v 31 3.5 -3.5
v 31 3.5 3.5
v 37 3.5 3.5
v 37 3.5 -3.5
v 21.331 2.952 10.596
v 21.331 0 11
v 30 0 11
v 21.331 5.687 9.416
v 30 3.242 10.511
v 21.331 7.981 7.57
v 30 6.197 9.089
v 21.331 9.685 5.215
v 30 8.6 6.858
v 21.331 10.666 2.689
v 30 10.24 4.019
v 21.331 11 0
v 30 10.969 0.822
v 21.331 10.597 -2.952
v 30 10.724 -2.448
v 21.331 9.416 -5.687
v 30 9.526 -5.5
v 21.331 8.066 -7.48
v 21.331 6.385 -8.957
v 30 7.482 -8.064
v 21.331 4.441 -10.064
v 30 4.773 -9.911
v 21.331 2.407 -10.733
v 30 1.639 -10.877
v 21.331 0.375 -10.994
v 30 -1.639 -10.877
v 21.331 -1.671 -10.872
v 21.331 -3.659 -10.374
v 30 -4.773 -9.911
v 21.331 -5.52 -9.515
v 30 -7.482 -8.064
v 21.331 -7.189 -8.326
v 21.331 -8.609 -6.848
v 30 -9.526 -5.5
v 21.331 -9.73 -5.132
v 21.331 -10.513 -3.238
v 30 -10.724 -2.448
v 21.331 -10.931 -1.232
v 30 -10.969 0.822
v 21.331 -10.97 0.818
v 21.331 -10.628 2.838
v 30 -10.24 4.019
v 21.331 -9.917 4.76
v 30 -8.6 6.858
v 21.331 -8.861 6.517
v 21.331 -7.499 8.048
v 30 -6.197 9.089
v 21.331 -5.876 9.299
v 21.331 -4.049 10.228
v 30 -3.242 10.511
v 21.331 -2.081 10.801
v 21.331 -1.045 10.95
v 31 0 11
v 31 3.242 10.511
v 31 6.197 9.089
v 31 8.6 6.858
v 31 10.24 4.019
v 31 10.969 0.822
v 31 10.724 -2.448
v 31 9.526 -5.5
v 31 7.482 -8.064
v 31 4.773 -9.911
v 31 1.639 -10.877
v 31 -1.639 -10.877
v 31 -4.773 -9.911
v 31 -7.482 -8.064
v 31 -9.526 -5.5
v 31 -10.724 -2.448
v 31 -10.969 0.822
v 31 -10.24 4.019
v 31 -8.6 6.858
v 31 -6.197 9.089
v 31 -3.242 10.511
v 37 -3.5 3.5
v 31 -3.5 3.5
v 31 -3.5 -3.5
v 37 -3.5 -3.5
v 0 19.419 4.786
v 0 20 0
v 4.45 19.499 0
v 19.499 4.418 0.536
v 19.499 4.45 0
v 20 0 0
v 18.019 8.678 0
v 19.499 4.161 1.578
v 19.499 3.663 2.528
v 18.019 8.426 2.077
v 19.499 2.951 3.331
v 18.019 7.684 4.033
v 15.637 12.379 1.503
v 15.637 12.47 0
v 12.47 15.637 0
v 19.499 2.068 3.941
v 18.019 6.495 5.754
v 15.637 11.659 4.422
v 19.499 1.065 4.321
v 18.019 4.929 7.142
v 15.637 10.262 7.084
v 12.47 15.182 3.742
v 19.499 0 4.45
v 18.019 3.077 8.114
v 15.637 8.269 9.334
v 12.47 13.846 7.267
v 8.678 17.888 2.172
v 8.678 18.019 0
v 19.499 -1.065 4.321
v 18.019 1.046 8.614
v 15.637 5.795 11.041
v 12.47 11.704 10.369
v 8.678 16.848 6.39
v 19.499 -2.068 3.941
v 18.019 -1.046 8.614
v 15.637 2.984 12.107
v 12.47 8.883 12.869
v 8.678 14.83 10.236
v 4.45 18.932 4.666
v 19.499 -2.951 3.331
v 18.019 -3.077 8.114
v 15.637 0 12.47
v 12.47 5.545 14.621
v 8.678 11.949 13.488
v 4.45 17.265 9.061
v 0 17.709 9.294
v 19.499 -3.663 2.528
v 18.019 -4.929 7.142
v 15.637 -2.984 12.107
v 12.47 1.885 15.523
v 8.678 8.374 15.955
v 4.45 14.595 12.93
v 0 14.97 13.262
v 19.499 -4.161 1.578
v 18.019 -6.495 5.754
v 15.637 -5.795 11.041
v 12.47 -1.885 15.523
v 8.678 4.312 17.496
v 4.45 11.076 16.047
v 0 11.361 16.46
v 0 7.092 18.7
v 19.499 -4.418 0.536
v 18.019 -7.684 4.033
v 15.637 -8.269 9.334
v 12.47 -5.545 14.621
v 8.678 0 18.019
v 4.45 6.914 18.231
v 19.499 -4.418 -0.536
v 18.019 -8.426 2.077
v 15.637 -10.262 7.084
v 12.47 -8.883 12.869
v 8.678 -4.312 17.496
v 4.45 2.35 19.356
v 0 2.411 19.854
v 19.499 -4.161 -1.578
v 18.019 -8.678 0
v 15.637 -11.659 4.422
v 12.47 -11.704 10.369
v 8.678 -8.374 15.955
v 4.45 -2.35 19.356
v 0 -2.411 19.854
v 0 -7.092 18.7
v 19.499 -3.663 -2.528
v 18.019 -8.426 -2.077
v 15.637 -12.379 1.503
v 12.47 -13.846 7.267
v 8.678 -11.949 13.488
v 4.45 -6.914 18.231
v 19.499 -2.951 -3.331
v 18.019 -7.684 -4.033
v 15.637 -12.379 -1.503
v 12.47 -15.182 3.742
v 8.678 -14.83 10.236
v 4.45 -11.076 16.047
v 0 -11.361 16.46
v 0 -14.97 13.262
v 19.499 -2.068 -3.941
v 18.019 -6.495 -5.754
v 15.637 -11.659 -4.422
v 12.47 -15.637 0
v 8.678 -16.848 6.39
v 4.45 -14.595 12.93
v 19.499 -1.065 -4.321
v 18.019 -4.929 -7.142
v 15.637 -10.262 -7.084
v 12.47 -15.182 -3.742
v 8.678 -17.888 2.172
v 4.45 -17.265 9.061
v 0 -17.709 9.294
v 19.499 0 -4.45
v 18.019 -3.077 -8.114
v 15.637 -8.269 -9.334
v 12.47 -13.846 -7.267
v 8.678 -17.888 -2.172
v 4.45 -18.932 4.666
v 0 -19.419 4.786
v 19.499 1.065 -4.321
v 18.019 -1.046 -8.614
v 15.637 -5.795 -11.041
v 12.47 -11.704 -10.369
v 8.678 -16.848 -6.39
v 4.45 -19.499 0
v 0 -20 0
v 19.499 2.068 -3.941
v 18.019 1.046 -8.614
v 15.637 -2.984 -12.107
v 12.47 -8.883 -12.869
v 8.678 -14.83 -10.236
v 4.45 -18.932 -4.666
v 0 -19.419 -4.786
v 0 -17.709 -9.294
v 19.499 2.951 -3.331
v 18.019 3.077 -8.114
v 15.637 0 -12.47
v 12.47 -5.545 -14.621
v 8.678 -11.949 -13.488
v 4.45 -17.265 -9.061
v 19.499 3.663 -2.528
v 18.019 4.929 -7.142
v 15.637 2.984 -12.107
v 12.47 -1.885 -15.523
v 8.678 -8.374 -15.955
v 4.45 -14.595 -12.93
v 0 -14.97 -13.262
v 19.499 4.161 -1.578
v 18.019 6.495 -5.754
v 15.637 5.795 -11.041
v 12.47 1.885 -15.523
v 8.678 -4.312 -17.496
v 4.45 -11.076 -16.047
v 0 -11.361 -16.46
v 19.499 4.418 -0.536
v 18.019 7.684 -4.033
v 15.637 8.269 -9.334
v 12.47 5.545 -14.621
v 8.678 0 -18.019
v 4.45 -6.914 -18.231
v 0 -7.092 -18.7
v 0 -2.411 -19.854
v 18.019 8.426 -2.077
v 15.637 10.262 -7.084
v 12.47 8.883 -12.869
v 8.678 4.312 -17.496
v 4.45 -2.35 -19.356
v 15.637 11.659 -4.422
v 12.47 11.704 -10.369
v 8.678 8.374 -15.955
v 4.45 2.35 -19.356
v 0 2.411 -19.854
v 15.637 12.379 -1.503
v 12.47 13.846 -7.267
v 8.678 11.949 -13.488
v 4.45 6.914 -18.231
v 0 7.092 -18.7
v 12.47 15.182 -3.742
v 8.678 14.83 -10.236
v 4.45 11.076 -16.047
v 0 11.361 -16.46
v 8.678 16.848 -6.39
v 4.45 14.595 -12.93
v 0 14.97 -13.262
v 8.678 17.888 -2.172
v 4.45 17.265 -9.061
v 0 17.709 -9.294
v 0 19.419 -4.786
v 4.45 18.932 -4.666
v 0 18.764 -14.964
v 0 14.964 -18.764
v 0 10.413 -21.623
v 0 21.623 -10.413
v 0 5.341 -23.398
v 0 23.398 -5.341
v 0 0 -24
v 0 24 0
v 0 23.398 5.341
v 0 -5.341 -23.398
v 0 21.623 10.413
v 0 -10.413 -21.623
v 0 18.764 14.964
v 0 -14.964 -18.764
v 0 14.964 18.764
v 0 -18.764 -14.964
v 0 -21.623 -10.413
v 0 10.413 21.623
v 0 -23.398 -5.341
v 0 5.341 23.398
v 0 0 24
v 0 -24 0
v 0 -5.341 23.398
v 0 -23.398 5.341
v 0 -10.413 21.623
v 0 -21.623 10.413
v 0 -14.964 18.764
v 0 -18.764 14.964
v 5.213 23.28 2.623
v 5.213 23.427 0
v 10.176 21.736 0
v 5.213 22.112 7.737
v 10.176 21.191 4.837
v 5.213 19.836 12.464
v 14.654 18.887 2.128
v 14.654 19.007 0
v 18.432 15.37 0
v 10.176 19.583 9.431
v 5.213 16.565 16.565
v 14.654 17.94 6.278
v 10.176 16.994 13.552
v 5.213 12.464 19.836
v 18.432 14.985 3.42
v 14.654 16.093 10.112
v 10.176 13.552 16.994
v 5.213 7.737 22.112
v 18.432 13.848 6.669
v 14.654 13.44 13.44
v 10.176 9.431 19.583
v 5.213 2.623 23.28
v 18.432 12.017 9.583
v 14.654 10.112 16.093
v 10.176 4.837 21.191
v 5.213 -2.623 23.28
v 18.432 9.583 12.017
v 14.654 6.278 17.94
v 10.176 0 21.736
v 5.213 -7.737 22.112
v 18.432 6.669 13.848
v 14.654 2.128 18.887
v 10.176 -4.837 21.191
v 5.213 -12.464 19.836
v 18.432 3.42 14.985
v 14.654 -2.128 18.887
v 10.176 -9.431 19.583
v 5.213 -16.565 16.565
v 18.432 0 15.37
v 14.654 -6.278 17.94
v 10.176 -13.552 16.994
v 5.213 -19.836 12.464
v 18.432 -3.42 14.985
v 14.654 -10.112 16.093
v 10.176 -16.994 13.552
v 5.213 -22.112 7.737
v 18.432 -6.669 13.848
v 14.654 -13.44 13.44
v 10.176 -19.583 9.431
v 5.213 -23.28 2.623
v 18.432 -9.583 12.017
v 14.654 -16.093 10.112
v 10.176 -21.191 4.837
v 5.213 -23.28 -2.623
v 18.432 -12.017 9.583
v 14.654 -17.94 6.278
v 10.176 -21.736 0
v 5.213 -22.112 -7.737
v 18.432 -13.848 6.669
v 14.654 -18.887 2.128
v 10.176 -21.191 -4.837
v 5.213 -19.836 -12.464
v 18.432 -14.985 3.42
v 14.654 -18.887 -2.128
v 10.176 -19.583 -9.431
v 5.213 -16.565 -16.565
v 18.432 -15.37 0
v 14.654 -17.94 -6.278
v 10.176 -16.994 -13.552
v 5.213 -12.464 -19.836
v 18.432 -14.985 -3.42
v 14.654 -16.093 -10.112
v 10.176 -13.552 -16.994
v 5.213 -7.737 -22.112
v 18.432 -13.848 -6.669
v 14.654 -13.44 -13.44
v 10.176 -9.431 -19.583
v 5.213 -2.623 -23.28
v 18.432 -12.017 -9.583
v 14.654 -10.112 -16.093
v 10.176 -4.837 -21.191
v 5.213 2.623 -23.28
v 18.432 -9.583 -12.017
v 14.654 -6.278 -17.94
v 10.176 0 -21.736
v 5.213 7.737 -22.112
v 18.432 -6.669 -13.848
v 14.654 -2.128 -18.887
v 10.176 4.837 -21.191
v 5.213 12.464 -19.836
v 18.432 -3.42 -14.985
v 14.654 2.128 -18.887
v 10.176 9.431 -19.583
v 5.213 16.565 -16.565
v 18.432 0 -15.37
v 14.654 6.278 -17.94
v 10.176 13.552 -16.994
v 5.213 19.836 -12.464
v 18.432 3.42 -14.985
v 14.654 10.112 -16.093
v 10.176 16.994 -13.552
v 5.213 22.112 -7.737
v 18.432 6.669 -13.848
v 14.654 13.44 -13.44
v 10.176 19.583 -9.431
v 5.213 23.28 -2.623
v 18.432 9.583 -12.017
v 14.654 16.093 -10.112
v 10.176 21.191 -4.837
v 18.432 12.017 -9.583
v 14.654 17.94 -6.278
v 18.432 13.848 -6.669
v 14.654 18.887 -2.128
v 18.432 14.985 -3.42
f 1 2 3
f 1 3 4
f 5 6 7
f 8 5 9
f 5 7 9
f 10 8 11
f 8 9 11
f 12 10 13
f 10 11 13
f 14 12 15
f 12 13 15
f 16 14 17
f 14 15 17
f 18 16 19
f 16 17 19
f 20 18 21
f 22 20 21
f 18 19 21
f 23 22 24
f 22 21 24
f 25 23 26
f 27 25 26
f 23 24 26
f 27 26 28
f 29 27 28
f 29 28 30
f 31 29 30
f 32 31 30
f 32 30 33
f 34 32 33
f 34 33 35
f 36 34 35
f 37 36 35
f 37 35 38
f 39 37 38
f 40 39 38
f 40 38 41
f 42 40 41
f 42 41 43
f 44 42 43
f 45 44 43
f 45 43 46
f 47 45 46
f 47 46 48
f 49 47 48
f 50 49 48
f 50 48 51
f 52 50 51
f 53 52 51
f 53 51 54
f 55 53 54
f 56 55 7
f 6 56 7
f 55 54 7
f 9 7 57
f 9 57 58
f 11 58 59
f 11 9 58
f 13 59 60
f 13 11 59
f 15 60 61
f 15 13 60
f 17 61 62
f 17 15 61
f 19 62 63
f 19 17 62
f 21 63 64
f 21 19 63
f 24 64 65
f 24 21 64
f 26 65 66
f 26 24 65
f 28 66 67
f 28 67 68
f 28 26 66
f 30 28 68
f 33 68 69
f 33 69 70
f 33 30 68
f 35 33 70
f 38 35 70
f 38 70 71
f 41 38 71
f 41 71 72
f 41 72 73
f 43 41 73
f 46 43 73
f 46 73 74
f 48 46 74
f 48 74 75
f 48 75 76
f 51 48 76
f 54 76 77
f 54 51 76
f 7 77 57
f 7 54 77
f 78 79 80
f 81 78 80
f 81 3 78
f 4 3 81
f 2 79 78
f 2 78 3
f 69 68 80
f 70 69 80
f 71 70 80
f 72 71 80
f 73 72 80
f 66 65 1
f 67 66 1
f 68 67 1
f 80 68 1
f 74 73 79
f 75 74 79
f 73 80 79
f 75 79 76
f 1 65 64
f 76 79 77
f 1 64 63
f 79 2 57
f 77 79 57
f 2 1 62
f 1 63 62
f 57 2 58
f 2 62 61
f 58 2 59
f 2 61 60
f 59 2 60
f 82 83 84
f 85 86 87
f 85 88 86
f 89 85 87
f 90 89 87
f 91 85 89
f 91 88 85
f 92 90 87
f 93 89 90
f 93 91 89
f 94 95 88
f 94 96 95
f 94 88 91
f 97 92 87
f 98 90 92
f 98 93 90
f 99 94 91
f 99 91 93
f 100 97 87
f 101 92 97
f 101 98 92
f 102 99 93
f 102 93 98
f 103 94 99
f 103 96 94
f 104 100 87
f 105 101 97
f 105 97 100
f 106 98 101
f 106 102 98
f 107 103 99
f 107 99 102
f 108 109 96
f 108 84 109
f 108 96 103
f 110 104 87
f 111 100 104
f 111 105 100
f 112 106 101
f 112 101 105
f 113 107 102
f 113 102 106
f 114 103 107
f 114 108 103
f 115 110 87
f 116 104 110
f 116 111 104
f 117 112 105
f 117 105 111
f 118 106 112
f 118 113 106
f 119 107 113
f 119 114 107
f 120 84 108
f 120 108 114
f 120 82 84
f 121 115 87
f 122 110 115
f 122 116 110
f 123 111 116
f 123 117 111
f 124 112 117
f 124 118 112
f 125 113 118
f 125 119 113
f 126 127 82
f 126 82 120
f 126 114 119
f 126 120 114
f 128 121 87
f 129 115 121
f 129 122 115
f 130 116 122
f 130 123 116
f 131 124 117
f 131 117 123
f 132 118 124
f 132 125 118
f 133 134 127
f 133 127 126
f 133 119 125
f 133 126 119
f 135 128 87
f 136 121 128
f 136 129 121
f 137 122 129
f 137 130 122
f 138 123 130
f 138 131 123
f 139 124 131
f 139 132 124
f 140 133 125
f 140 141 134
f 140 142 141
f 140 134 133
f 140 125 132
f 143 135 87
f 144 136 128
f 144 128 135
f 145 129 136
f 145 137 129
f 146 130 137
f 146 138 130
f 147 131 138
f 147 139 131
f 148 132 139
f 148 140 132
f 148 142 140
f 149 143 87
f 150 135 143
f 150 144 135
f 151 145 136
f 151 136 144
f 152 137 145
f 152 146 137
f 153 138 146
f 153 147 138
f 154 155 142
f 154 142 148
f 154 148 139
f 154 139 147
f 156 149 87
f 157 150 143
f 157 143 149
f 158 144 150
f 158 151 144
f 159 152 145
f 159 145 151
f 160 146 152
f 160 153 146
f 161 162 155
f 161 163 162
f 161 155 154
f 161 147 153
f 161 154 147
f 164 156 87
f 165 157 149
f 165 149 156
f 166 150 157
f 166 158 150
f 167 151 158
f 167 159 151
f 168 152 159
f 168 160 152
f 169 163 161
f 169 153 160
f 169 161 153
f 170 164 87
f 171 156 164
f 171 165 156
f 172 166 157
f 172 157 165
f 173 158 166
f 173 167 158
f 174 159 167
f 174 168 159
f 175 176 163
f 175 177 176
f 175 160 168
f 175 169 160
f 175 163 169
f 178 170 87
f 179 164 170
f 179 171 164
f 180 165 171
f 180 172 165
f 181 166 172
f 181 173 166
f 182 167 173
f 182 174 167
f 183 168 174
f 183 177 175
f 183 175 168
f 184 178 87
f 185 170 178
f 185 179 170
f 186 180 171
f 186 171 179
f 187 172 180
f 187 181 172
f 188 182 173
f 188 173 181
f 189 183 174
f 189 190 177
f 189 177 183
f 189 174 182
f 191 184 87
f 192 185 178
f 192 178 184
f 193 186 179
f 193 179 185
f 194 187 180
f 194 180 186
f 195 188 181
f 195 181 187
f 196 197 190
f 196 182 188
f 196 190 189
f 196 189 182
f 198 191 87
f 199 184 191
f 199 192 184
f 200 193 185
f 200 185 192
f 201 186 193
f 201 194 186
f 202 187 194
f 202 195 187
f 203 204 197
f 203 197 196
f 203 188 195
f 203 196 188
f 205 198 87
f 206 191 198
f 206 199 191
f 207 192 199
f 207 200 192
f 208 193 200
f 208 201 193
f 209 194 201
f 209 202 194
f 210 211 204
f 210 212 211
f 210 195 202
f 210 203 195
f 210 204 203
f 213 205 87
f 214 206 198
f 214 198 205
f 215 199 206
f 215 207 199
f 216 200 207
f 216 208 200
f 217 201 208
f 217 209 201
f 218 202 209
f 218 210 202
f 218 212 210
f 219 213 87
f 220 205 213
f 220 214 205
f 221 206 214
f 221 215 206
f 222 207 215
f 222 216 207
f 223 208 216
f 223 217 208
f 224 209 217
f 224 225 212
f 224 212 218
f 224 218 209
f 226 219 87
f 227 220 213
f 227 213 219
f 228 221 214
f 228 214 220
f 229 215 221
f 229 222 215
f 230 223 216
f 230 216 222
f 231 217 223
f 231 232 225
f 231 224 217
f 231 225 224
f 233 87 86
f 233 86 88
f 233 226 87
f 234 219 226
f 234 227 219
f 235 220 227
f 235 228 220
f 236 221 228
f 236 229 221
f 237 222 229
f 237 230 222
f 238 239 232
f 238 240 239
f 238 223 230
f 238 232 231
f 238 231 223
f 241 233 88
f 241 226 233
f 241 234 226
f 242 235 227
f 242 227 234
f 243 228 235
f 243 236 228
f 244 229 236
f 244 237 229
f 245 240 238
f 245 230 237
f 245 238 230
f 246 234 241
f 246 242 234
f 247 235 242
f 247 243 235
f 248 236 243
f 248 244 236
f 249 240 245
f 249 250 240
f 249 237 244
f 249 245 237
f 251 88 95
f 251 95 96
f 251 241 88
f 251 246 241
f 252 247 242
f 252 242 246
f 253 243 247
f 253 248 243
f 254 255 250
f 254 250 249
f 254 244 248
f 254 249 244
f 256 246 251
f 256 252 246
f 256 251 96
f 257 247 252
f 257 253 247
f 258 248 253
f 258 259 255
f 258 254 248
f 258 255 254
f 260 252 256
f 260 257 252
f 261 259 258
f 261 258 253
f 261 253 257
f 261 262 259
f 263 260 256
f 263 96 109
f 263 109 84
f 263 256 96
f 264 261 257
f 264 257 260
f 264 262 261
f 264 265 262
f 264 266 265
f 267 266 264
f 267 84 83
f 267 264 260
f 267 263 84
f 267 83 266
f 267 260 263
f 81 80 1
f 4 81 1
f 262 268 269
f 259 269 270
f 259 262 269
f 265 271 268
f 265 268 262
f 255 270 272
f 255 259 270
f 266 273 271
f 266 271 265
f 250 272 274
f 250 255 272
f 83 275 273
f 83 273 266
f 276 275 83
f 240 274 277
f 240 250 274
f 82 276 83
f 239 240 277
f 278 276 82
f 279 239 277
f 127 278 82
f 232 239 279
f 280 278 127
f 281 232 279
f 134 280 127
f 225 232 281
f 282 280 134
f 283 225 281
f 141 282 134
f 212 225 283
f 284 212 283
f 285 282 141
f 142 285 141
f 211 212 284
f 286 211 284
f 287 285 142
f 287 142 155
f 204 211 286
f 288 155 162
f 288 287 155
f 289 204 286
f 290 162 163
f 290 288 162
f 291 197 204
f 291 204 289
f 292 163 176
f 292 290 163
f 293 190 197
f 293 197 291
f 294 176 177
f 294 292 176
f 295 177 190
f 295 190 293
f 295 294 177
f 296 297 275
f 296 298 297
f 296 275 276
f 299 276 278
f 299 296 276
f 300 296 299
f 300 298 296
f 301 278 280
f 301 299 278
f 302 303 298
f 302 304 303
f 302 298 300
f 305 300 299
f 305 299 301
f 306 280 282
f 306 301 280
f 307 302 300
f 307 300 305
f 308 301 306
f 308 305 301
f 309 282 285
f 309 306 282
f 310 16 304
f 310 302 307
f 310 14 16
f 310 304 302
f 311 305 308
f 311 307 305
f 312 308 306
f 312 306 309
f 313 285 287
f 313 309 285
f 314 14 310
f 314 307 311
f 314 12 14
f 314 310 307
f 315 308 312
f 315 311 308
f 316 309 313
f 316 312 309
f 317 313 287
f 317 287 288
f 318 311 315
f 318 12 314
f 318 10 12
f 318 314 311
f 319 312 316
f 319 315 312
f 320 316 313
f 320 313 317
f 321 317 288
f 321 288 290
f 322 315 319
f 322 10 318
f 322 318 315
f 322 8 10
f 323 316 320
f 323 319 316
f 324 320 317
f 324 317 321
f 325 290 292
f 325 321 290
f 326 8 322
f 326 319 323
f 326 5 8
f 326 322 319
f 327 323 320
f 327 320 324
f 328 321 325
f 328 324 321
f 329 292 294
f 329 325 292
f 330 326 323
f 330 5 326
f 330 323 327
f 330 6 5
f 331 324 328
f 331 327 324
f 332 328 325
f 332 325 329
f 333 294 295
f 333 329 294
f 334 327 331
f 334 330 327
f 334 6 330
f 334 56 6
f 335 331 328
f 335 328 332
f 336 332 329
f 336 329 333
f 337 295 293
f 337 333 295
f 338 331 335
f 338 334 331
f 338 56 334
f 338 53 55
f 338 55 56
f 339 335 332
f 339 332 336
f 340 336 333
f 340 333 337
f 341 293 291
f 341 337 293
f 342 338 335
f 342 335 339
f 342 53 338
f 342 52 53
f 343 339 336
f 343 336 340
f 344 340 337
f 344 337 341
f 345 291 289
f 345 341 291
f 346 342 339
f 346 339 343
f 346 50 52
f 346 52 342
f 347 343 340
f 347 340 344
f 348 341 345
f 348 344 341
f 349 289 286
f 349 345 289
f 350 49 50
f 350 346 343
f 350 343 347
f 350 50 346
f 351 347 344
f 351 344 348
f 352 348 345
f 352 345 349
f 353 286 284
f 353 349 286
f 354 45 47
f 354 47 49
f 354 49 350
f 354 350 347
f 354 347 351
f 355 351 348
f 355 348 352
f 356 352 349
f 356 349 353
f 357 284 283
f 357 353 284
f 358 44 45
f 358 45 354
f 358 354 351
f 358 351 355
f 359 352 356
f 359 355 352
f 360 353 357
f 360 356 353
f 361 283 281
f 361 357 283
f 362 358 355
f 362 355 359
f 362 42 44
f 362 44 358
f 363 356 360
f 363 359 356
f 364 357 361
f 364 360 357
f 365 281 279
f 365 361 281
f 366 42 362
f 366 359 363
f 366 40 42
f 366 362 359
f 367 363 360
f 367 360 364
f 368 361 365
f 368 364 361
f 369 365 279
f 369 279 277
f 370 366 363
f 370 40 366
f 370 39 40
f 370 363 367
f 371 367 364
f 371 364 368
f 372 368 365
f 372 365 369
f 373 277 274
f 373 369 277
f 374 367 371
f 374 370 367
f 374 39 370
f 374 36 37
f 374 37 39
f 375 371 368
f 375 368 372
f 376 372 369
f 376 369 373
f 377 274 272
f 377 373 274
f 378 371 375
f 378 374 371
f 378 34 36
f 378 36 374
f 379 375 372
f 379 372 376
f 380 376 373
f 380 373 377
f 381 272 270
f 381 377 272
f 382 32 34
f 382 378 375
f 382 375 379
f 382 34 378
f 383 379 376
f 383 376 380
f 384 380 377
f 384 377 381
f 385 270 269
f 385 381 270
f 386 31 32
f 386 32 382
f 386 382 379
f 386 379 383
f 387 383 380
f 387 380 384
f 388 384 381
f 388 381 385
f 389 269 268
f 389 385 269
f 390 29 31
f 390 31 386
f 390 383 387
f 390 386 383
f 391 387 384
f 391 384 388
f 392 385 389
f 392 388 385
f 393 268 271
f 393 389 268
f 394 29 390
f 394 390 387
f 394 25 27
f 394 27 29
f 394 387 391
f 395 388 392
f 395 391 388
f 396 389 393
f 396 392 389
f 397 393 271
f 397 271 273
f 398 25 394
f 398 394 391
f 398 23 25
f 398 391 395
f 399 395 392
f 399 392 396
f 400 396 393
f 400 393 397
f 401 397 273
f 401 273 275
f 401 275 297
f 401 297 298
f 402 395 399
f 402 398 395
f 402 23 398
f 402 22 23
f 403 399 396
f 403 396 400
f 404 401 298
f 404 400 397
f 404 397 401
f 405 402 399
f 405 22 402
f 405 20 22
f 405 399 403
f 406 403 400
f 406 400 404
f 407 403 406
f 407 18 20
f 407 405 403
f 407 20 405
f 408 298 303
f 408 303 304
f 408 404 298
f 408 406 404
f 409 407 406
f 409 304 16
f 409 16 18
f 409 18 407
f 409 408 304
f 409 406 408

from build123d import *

# Parameters (mm, degrees)
BOSS_EXTRUDE1_START             = -30
SKETCH2_R                       = 11
BOSS_EXTRUDE1_DEPTH             = 1
BOSS_EXTRUDE1_DIRECTION_2_REACH = 73.569
SKETCH4_W                       = 7
SKETCH4_H                       = 7
BOSS_EXTRUDE2_DEPTH             = 6


with BuildPart() as part:
    # Sketch1 → Revolve-Thin1 (revolve)
    with BuildSketch(Plane.XY):
        with BuildLine():
            ThreePointArc((20, 0), (14.142135624, 14.142135624), (0, 20))
            Line((0, 20), (0, 24))
            ThreePointArc((0, 24), (16.970562748, 16.970562748), (24, 0))
            Line((24, 0), (20, 0))
        make_face()
    revolve(axis=Axis((0, 0, 0), (1, 0, 0)))

    # Sketch2 → Boss-Extrude1 (add)
    with BuildSketch(Plane.ZY.offset(BOSS_EXTRUDE1_START)):
        Circle(SKETCH2_R)
    extrude(amount=-BOSS_EXTRUDE1_DEPTH)

    # Sketch2 → Boss-Extrude1 direction 2 (add, up to next)
    with BuildSketch(Plane.ZY.offset(BOSS_EXTRUDE1_START), mode=Mode.PRIVATE) as boss_extrude1_direction_2_sk1:
        Circle(SKETCH2_R)
    boss_extrude1_direction_2_tool1 = extrude(boss_extrude1_direction_2_sk1.sketch, amount=BOSS_EXTRUDE1_DIRECTION_2_REACH, mode=Mode.PRIVATE) - part.part
    add(boss_extrude1_direction_2_tool1.solids().sort_by_distance((30, 0, 0))[0])

    # Sketch4 → Boss-Extrude2 (add)
    with BuildSketch(Plane(origin=(31, 0, 0), x_dir=(0, 0, -1), z_dir=(1, 0, 0))):
        Rectangle(SKETCH4_W, SKETCH4_H)
    extrude(amount=BOSS_EXTRUDE2_DEPTH)


solid = part.part
